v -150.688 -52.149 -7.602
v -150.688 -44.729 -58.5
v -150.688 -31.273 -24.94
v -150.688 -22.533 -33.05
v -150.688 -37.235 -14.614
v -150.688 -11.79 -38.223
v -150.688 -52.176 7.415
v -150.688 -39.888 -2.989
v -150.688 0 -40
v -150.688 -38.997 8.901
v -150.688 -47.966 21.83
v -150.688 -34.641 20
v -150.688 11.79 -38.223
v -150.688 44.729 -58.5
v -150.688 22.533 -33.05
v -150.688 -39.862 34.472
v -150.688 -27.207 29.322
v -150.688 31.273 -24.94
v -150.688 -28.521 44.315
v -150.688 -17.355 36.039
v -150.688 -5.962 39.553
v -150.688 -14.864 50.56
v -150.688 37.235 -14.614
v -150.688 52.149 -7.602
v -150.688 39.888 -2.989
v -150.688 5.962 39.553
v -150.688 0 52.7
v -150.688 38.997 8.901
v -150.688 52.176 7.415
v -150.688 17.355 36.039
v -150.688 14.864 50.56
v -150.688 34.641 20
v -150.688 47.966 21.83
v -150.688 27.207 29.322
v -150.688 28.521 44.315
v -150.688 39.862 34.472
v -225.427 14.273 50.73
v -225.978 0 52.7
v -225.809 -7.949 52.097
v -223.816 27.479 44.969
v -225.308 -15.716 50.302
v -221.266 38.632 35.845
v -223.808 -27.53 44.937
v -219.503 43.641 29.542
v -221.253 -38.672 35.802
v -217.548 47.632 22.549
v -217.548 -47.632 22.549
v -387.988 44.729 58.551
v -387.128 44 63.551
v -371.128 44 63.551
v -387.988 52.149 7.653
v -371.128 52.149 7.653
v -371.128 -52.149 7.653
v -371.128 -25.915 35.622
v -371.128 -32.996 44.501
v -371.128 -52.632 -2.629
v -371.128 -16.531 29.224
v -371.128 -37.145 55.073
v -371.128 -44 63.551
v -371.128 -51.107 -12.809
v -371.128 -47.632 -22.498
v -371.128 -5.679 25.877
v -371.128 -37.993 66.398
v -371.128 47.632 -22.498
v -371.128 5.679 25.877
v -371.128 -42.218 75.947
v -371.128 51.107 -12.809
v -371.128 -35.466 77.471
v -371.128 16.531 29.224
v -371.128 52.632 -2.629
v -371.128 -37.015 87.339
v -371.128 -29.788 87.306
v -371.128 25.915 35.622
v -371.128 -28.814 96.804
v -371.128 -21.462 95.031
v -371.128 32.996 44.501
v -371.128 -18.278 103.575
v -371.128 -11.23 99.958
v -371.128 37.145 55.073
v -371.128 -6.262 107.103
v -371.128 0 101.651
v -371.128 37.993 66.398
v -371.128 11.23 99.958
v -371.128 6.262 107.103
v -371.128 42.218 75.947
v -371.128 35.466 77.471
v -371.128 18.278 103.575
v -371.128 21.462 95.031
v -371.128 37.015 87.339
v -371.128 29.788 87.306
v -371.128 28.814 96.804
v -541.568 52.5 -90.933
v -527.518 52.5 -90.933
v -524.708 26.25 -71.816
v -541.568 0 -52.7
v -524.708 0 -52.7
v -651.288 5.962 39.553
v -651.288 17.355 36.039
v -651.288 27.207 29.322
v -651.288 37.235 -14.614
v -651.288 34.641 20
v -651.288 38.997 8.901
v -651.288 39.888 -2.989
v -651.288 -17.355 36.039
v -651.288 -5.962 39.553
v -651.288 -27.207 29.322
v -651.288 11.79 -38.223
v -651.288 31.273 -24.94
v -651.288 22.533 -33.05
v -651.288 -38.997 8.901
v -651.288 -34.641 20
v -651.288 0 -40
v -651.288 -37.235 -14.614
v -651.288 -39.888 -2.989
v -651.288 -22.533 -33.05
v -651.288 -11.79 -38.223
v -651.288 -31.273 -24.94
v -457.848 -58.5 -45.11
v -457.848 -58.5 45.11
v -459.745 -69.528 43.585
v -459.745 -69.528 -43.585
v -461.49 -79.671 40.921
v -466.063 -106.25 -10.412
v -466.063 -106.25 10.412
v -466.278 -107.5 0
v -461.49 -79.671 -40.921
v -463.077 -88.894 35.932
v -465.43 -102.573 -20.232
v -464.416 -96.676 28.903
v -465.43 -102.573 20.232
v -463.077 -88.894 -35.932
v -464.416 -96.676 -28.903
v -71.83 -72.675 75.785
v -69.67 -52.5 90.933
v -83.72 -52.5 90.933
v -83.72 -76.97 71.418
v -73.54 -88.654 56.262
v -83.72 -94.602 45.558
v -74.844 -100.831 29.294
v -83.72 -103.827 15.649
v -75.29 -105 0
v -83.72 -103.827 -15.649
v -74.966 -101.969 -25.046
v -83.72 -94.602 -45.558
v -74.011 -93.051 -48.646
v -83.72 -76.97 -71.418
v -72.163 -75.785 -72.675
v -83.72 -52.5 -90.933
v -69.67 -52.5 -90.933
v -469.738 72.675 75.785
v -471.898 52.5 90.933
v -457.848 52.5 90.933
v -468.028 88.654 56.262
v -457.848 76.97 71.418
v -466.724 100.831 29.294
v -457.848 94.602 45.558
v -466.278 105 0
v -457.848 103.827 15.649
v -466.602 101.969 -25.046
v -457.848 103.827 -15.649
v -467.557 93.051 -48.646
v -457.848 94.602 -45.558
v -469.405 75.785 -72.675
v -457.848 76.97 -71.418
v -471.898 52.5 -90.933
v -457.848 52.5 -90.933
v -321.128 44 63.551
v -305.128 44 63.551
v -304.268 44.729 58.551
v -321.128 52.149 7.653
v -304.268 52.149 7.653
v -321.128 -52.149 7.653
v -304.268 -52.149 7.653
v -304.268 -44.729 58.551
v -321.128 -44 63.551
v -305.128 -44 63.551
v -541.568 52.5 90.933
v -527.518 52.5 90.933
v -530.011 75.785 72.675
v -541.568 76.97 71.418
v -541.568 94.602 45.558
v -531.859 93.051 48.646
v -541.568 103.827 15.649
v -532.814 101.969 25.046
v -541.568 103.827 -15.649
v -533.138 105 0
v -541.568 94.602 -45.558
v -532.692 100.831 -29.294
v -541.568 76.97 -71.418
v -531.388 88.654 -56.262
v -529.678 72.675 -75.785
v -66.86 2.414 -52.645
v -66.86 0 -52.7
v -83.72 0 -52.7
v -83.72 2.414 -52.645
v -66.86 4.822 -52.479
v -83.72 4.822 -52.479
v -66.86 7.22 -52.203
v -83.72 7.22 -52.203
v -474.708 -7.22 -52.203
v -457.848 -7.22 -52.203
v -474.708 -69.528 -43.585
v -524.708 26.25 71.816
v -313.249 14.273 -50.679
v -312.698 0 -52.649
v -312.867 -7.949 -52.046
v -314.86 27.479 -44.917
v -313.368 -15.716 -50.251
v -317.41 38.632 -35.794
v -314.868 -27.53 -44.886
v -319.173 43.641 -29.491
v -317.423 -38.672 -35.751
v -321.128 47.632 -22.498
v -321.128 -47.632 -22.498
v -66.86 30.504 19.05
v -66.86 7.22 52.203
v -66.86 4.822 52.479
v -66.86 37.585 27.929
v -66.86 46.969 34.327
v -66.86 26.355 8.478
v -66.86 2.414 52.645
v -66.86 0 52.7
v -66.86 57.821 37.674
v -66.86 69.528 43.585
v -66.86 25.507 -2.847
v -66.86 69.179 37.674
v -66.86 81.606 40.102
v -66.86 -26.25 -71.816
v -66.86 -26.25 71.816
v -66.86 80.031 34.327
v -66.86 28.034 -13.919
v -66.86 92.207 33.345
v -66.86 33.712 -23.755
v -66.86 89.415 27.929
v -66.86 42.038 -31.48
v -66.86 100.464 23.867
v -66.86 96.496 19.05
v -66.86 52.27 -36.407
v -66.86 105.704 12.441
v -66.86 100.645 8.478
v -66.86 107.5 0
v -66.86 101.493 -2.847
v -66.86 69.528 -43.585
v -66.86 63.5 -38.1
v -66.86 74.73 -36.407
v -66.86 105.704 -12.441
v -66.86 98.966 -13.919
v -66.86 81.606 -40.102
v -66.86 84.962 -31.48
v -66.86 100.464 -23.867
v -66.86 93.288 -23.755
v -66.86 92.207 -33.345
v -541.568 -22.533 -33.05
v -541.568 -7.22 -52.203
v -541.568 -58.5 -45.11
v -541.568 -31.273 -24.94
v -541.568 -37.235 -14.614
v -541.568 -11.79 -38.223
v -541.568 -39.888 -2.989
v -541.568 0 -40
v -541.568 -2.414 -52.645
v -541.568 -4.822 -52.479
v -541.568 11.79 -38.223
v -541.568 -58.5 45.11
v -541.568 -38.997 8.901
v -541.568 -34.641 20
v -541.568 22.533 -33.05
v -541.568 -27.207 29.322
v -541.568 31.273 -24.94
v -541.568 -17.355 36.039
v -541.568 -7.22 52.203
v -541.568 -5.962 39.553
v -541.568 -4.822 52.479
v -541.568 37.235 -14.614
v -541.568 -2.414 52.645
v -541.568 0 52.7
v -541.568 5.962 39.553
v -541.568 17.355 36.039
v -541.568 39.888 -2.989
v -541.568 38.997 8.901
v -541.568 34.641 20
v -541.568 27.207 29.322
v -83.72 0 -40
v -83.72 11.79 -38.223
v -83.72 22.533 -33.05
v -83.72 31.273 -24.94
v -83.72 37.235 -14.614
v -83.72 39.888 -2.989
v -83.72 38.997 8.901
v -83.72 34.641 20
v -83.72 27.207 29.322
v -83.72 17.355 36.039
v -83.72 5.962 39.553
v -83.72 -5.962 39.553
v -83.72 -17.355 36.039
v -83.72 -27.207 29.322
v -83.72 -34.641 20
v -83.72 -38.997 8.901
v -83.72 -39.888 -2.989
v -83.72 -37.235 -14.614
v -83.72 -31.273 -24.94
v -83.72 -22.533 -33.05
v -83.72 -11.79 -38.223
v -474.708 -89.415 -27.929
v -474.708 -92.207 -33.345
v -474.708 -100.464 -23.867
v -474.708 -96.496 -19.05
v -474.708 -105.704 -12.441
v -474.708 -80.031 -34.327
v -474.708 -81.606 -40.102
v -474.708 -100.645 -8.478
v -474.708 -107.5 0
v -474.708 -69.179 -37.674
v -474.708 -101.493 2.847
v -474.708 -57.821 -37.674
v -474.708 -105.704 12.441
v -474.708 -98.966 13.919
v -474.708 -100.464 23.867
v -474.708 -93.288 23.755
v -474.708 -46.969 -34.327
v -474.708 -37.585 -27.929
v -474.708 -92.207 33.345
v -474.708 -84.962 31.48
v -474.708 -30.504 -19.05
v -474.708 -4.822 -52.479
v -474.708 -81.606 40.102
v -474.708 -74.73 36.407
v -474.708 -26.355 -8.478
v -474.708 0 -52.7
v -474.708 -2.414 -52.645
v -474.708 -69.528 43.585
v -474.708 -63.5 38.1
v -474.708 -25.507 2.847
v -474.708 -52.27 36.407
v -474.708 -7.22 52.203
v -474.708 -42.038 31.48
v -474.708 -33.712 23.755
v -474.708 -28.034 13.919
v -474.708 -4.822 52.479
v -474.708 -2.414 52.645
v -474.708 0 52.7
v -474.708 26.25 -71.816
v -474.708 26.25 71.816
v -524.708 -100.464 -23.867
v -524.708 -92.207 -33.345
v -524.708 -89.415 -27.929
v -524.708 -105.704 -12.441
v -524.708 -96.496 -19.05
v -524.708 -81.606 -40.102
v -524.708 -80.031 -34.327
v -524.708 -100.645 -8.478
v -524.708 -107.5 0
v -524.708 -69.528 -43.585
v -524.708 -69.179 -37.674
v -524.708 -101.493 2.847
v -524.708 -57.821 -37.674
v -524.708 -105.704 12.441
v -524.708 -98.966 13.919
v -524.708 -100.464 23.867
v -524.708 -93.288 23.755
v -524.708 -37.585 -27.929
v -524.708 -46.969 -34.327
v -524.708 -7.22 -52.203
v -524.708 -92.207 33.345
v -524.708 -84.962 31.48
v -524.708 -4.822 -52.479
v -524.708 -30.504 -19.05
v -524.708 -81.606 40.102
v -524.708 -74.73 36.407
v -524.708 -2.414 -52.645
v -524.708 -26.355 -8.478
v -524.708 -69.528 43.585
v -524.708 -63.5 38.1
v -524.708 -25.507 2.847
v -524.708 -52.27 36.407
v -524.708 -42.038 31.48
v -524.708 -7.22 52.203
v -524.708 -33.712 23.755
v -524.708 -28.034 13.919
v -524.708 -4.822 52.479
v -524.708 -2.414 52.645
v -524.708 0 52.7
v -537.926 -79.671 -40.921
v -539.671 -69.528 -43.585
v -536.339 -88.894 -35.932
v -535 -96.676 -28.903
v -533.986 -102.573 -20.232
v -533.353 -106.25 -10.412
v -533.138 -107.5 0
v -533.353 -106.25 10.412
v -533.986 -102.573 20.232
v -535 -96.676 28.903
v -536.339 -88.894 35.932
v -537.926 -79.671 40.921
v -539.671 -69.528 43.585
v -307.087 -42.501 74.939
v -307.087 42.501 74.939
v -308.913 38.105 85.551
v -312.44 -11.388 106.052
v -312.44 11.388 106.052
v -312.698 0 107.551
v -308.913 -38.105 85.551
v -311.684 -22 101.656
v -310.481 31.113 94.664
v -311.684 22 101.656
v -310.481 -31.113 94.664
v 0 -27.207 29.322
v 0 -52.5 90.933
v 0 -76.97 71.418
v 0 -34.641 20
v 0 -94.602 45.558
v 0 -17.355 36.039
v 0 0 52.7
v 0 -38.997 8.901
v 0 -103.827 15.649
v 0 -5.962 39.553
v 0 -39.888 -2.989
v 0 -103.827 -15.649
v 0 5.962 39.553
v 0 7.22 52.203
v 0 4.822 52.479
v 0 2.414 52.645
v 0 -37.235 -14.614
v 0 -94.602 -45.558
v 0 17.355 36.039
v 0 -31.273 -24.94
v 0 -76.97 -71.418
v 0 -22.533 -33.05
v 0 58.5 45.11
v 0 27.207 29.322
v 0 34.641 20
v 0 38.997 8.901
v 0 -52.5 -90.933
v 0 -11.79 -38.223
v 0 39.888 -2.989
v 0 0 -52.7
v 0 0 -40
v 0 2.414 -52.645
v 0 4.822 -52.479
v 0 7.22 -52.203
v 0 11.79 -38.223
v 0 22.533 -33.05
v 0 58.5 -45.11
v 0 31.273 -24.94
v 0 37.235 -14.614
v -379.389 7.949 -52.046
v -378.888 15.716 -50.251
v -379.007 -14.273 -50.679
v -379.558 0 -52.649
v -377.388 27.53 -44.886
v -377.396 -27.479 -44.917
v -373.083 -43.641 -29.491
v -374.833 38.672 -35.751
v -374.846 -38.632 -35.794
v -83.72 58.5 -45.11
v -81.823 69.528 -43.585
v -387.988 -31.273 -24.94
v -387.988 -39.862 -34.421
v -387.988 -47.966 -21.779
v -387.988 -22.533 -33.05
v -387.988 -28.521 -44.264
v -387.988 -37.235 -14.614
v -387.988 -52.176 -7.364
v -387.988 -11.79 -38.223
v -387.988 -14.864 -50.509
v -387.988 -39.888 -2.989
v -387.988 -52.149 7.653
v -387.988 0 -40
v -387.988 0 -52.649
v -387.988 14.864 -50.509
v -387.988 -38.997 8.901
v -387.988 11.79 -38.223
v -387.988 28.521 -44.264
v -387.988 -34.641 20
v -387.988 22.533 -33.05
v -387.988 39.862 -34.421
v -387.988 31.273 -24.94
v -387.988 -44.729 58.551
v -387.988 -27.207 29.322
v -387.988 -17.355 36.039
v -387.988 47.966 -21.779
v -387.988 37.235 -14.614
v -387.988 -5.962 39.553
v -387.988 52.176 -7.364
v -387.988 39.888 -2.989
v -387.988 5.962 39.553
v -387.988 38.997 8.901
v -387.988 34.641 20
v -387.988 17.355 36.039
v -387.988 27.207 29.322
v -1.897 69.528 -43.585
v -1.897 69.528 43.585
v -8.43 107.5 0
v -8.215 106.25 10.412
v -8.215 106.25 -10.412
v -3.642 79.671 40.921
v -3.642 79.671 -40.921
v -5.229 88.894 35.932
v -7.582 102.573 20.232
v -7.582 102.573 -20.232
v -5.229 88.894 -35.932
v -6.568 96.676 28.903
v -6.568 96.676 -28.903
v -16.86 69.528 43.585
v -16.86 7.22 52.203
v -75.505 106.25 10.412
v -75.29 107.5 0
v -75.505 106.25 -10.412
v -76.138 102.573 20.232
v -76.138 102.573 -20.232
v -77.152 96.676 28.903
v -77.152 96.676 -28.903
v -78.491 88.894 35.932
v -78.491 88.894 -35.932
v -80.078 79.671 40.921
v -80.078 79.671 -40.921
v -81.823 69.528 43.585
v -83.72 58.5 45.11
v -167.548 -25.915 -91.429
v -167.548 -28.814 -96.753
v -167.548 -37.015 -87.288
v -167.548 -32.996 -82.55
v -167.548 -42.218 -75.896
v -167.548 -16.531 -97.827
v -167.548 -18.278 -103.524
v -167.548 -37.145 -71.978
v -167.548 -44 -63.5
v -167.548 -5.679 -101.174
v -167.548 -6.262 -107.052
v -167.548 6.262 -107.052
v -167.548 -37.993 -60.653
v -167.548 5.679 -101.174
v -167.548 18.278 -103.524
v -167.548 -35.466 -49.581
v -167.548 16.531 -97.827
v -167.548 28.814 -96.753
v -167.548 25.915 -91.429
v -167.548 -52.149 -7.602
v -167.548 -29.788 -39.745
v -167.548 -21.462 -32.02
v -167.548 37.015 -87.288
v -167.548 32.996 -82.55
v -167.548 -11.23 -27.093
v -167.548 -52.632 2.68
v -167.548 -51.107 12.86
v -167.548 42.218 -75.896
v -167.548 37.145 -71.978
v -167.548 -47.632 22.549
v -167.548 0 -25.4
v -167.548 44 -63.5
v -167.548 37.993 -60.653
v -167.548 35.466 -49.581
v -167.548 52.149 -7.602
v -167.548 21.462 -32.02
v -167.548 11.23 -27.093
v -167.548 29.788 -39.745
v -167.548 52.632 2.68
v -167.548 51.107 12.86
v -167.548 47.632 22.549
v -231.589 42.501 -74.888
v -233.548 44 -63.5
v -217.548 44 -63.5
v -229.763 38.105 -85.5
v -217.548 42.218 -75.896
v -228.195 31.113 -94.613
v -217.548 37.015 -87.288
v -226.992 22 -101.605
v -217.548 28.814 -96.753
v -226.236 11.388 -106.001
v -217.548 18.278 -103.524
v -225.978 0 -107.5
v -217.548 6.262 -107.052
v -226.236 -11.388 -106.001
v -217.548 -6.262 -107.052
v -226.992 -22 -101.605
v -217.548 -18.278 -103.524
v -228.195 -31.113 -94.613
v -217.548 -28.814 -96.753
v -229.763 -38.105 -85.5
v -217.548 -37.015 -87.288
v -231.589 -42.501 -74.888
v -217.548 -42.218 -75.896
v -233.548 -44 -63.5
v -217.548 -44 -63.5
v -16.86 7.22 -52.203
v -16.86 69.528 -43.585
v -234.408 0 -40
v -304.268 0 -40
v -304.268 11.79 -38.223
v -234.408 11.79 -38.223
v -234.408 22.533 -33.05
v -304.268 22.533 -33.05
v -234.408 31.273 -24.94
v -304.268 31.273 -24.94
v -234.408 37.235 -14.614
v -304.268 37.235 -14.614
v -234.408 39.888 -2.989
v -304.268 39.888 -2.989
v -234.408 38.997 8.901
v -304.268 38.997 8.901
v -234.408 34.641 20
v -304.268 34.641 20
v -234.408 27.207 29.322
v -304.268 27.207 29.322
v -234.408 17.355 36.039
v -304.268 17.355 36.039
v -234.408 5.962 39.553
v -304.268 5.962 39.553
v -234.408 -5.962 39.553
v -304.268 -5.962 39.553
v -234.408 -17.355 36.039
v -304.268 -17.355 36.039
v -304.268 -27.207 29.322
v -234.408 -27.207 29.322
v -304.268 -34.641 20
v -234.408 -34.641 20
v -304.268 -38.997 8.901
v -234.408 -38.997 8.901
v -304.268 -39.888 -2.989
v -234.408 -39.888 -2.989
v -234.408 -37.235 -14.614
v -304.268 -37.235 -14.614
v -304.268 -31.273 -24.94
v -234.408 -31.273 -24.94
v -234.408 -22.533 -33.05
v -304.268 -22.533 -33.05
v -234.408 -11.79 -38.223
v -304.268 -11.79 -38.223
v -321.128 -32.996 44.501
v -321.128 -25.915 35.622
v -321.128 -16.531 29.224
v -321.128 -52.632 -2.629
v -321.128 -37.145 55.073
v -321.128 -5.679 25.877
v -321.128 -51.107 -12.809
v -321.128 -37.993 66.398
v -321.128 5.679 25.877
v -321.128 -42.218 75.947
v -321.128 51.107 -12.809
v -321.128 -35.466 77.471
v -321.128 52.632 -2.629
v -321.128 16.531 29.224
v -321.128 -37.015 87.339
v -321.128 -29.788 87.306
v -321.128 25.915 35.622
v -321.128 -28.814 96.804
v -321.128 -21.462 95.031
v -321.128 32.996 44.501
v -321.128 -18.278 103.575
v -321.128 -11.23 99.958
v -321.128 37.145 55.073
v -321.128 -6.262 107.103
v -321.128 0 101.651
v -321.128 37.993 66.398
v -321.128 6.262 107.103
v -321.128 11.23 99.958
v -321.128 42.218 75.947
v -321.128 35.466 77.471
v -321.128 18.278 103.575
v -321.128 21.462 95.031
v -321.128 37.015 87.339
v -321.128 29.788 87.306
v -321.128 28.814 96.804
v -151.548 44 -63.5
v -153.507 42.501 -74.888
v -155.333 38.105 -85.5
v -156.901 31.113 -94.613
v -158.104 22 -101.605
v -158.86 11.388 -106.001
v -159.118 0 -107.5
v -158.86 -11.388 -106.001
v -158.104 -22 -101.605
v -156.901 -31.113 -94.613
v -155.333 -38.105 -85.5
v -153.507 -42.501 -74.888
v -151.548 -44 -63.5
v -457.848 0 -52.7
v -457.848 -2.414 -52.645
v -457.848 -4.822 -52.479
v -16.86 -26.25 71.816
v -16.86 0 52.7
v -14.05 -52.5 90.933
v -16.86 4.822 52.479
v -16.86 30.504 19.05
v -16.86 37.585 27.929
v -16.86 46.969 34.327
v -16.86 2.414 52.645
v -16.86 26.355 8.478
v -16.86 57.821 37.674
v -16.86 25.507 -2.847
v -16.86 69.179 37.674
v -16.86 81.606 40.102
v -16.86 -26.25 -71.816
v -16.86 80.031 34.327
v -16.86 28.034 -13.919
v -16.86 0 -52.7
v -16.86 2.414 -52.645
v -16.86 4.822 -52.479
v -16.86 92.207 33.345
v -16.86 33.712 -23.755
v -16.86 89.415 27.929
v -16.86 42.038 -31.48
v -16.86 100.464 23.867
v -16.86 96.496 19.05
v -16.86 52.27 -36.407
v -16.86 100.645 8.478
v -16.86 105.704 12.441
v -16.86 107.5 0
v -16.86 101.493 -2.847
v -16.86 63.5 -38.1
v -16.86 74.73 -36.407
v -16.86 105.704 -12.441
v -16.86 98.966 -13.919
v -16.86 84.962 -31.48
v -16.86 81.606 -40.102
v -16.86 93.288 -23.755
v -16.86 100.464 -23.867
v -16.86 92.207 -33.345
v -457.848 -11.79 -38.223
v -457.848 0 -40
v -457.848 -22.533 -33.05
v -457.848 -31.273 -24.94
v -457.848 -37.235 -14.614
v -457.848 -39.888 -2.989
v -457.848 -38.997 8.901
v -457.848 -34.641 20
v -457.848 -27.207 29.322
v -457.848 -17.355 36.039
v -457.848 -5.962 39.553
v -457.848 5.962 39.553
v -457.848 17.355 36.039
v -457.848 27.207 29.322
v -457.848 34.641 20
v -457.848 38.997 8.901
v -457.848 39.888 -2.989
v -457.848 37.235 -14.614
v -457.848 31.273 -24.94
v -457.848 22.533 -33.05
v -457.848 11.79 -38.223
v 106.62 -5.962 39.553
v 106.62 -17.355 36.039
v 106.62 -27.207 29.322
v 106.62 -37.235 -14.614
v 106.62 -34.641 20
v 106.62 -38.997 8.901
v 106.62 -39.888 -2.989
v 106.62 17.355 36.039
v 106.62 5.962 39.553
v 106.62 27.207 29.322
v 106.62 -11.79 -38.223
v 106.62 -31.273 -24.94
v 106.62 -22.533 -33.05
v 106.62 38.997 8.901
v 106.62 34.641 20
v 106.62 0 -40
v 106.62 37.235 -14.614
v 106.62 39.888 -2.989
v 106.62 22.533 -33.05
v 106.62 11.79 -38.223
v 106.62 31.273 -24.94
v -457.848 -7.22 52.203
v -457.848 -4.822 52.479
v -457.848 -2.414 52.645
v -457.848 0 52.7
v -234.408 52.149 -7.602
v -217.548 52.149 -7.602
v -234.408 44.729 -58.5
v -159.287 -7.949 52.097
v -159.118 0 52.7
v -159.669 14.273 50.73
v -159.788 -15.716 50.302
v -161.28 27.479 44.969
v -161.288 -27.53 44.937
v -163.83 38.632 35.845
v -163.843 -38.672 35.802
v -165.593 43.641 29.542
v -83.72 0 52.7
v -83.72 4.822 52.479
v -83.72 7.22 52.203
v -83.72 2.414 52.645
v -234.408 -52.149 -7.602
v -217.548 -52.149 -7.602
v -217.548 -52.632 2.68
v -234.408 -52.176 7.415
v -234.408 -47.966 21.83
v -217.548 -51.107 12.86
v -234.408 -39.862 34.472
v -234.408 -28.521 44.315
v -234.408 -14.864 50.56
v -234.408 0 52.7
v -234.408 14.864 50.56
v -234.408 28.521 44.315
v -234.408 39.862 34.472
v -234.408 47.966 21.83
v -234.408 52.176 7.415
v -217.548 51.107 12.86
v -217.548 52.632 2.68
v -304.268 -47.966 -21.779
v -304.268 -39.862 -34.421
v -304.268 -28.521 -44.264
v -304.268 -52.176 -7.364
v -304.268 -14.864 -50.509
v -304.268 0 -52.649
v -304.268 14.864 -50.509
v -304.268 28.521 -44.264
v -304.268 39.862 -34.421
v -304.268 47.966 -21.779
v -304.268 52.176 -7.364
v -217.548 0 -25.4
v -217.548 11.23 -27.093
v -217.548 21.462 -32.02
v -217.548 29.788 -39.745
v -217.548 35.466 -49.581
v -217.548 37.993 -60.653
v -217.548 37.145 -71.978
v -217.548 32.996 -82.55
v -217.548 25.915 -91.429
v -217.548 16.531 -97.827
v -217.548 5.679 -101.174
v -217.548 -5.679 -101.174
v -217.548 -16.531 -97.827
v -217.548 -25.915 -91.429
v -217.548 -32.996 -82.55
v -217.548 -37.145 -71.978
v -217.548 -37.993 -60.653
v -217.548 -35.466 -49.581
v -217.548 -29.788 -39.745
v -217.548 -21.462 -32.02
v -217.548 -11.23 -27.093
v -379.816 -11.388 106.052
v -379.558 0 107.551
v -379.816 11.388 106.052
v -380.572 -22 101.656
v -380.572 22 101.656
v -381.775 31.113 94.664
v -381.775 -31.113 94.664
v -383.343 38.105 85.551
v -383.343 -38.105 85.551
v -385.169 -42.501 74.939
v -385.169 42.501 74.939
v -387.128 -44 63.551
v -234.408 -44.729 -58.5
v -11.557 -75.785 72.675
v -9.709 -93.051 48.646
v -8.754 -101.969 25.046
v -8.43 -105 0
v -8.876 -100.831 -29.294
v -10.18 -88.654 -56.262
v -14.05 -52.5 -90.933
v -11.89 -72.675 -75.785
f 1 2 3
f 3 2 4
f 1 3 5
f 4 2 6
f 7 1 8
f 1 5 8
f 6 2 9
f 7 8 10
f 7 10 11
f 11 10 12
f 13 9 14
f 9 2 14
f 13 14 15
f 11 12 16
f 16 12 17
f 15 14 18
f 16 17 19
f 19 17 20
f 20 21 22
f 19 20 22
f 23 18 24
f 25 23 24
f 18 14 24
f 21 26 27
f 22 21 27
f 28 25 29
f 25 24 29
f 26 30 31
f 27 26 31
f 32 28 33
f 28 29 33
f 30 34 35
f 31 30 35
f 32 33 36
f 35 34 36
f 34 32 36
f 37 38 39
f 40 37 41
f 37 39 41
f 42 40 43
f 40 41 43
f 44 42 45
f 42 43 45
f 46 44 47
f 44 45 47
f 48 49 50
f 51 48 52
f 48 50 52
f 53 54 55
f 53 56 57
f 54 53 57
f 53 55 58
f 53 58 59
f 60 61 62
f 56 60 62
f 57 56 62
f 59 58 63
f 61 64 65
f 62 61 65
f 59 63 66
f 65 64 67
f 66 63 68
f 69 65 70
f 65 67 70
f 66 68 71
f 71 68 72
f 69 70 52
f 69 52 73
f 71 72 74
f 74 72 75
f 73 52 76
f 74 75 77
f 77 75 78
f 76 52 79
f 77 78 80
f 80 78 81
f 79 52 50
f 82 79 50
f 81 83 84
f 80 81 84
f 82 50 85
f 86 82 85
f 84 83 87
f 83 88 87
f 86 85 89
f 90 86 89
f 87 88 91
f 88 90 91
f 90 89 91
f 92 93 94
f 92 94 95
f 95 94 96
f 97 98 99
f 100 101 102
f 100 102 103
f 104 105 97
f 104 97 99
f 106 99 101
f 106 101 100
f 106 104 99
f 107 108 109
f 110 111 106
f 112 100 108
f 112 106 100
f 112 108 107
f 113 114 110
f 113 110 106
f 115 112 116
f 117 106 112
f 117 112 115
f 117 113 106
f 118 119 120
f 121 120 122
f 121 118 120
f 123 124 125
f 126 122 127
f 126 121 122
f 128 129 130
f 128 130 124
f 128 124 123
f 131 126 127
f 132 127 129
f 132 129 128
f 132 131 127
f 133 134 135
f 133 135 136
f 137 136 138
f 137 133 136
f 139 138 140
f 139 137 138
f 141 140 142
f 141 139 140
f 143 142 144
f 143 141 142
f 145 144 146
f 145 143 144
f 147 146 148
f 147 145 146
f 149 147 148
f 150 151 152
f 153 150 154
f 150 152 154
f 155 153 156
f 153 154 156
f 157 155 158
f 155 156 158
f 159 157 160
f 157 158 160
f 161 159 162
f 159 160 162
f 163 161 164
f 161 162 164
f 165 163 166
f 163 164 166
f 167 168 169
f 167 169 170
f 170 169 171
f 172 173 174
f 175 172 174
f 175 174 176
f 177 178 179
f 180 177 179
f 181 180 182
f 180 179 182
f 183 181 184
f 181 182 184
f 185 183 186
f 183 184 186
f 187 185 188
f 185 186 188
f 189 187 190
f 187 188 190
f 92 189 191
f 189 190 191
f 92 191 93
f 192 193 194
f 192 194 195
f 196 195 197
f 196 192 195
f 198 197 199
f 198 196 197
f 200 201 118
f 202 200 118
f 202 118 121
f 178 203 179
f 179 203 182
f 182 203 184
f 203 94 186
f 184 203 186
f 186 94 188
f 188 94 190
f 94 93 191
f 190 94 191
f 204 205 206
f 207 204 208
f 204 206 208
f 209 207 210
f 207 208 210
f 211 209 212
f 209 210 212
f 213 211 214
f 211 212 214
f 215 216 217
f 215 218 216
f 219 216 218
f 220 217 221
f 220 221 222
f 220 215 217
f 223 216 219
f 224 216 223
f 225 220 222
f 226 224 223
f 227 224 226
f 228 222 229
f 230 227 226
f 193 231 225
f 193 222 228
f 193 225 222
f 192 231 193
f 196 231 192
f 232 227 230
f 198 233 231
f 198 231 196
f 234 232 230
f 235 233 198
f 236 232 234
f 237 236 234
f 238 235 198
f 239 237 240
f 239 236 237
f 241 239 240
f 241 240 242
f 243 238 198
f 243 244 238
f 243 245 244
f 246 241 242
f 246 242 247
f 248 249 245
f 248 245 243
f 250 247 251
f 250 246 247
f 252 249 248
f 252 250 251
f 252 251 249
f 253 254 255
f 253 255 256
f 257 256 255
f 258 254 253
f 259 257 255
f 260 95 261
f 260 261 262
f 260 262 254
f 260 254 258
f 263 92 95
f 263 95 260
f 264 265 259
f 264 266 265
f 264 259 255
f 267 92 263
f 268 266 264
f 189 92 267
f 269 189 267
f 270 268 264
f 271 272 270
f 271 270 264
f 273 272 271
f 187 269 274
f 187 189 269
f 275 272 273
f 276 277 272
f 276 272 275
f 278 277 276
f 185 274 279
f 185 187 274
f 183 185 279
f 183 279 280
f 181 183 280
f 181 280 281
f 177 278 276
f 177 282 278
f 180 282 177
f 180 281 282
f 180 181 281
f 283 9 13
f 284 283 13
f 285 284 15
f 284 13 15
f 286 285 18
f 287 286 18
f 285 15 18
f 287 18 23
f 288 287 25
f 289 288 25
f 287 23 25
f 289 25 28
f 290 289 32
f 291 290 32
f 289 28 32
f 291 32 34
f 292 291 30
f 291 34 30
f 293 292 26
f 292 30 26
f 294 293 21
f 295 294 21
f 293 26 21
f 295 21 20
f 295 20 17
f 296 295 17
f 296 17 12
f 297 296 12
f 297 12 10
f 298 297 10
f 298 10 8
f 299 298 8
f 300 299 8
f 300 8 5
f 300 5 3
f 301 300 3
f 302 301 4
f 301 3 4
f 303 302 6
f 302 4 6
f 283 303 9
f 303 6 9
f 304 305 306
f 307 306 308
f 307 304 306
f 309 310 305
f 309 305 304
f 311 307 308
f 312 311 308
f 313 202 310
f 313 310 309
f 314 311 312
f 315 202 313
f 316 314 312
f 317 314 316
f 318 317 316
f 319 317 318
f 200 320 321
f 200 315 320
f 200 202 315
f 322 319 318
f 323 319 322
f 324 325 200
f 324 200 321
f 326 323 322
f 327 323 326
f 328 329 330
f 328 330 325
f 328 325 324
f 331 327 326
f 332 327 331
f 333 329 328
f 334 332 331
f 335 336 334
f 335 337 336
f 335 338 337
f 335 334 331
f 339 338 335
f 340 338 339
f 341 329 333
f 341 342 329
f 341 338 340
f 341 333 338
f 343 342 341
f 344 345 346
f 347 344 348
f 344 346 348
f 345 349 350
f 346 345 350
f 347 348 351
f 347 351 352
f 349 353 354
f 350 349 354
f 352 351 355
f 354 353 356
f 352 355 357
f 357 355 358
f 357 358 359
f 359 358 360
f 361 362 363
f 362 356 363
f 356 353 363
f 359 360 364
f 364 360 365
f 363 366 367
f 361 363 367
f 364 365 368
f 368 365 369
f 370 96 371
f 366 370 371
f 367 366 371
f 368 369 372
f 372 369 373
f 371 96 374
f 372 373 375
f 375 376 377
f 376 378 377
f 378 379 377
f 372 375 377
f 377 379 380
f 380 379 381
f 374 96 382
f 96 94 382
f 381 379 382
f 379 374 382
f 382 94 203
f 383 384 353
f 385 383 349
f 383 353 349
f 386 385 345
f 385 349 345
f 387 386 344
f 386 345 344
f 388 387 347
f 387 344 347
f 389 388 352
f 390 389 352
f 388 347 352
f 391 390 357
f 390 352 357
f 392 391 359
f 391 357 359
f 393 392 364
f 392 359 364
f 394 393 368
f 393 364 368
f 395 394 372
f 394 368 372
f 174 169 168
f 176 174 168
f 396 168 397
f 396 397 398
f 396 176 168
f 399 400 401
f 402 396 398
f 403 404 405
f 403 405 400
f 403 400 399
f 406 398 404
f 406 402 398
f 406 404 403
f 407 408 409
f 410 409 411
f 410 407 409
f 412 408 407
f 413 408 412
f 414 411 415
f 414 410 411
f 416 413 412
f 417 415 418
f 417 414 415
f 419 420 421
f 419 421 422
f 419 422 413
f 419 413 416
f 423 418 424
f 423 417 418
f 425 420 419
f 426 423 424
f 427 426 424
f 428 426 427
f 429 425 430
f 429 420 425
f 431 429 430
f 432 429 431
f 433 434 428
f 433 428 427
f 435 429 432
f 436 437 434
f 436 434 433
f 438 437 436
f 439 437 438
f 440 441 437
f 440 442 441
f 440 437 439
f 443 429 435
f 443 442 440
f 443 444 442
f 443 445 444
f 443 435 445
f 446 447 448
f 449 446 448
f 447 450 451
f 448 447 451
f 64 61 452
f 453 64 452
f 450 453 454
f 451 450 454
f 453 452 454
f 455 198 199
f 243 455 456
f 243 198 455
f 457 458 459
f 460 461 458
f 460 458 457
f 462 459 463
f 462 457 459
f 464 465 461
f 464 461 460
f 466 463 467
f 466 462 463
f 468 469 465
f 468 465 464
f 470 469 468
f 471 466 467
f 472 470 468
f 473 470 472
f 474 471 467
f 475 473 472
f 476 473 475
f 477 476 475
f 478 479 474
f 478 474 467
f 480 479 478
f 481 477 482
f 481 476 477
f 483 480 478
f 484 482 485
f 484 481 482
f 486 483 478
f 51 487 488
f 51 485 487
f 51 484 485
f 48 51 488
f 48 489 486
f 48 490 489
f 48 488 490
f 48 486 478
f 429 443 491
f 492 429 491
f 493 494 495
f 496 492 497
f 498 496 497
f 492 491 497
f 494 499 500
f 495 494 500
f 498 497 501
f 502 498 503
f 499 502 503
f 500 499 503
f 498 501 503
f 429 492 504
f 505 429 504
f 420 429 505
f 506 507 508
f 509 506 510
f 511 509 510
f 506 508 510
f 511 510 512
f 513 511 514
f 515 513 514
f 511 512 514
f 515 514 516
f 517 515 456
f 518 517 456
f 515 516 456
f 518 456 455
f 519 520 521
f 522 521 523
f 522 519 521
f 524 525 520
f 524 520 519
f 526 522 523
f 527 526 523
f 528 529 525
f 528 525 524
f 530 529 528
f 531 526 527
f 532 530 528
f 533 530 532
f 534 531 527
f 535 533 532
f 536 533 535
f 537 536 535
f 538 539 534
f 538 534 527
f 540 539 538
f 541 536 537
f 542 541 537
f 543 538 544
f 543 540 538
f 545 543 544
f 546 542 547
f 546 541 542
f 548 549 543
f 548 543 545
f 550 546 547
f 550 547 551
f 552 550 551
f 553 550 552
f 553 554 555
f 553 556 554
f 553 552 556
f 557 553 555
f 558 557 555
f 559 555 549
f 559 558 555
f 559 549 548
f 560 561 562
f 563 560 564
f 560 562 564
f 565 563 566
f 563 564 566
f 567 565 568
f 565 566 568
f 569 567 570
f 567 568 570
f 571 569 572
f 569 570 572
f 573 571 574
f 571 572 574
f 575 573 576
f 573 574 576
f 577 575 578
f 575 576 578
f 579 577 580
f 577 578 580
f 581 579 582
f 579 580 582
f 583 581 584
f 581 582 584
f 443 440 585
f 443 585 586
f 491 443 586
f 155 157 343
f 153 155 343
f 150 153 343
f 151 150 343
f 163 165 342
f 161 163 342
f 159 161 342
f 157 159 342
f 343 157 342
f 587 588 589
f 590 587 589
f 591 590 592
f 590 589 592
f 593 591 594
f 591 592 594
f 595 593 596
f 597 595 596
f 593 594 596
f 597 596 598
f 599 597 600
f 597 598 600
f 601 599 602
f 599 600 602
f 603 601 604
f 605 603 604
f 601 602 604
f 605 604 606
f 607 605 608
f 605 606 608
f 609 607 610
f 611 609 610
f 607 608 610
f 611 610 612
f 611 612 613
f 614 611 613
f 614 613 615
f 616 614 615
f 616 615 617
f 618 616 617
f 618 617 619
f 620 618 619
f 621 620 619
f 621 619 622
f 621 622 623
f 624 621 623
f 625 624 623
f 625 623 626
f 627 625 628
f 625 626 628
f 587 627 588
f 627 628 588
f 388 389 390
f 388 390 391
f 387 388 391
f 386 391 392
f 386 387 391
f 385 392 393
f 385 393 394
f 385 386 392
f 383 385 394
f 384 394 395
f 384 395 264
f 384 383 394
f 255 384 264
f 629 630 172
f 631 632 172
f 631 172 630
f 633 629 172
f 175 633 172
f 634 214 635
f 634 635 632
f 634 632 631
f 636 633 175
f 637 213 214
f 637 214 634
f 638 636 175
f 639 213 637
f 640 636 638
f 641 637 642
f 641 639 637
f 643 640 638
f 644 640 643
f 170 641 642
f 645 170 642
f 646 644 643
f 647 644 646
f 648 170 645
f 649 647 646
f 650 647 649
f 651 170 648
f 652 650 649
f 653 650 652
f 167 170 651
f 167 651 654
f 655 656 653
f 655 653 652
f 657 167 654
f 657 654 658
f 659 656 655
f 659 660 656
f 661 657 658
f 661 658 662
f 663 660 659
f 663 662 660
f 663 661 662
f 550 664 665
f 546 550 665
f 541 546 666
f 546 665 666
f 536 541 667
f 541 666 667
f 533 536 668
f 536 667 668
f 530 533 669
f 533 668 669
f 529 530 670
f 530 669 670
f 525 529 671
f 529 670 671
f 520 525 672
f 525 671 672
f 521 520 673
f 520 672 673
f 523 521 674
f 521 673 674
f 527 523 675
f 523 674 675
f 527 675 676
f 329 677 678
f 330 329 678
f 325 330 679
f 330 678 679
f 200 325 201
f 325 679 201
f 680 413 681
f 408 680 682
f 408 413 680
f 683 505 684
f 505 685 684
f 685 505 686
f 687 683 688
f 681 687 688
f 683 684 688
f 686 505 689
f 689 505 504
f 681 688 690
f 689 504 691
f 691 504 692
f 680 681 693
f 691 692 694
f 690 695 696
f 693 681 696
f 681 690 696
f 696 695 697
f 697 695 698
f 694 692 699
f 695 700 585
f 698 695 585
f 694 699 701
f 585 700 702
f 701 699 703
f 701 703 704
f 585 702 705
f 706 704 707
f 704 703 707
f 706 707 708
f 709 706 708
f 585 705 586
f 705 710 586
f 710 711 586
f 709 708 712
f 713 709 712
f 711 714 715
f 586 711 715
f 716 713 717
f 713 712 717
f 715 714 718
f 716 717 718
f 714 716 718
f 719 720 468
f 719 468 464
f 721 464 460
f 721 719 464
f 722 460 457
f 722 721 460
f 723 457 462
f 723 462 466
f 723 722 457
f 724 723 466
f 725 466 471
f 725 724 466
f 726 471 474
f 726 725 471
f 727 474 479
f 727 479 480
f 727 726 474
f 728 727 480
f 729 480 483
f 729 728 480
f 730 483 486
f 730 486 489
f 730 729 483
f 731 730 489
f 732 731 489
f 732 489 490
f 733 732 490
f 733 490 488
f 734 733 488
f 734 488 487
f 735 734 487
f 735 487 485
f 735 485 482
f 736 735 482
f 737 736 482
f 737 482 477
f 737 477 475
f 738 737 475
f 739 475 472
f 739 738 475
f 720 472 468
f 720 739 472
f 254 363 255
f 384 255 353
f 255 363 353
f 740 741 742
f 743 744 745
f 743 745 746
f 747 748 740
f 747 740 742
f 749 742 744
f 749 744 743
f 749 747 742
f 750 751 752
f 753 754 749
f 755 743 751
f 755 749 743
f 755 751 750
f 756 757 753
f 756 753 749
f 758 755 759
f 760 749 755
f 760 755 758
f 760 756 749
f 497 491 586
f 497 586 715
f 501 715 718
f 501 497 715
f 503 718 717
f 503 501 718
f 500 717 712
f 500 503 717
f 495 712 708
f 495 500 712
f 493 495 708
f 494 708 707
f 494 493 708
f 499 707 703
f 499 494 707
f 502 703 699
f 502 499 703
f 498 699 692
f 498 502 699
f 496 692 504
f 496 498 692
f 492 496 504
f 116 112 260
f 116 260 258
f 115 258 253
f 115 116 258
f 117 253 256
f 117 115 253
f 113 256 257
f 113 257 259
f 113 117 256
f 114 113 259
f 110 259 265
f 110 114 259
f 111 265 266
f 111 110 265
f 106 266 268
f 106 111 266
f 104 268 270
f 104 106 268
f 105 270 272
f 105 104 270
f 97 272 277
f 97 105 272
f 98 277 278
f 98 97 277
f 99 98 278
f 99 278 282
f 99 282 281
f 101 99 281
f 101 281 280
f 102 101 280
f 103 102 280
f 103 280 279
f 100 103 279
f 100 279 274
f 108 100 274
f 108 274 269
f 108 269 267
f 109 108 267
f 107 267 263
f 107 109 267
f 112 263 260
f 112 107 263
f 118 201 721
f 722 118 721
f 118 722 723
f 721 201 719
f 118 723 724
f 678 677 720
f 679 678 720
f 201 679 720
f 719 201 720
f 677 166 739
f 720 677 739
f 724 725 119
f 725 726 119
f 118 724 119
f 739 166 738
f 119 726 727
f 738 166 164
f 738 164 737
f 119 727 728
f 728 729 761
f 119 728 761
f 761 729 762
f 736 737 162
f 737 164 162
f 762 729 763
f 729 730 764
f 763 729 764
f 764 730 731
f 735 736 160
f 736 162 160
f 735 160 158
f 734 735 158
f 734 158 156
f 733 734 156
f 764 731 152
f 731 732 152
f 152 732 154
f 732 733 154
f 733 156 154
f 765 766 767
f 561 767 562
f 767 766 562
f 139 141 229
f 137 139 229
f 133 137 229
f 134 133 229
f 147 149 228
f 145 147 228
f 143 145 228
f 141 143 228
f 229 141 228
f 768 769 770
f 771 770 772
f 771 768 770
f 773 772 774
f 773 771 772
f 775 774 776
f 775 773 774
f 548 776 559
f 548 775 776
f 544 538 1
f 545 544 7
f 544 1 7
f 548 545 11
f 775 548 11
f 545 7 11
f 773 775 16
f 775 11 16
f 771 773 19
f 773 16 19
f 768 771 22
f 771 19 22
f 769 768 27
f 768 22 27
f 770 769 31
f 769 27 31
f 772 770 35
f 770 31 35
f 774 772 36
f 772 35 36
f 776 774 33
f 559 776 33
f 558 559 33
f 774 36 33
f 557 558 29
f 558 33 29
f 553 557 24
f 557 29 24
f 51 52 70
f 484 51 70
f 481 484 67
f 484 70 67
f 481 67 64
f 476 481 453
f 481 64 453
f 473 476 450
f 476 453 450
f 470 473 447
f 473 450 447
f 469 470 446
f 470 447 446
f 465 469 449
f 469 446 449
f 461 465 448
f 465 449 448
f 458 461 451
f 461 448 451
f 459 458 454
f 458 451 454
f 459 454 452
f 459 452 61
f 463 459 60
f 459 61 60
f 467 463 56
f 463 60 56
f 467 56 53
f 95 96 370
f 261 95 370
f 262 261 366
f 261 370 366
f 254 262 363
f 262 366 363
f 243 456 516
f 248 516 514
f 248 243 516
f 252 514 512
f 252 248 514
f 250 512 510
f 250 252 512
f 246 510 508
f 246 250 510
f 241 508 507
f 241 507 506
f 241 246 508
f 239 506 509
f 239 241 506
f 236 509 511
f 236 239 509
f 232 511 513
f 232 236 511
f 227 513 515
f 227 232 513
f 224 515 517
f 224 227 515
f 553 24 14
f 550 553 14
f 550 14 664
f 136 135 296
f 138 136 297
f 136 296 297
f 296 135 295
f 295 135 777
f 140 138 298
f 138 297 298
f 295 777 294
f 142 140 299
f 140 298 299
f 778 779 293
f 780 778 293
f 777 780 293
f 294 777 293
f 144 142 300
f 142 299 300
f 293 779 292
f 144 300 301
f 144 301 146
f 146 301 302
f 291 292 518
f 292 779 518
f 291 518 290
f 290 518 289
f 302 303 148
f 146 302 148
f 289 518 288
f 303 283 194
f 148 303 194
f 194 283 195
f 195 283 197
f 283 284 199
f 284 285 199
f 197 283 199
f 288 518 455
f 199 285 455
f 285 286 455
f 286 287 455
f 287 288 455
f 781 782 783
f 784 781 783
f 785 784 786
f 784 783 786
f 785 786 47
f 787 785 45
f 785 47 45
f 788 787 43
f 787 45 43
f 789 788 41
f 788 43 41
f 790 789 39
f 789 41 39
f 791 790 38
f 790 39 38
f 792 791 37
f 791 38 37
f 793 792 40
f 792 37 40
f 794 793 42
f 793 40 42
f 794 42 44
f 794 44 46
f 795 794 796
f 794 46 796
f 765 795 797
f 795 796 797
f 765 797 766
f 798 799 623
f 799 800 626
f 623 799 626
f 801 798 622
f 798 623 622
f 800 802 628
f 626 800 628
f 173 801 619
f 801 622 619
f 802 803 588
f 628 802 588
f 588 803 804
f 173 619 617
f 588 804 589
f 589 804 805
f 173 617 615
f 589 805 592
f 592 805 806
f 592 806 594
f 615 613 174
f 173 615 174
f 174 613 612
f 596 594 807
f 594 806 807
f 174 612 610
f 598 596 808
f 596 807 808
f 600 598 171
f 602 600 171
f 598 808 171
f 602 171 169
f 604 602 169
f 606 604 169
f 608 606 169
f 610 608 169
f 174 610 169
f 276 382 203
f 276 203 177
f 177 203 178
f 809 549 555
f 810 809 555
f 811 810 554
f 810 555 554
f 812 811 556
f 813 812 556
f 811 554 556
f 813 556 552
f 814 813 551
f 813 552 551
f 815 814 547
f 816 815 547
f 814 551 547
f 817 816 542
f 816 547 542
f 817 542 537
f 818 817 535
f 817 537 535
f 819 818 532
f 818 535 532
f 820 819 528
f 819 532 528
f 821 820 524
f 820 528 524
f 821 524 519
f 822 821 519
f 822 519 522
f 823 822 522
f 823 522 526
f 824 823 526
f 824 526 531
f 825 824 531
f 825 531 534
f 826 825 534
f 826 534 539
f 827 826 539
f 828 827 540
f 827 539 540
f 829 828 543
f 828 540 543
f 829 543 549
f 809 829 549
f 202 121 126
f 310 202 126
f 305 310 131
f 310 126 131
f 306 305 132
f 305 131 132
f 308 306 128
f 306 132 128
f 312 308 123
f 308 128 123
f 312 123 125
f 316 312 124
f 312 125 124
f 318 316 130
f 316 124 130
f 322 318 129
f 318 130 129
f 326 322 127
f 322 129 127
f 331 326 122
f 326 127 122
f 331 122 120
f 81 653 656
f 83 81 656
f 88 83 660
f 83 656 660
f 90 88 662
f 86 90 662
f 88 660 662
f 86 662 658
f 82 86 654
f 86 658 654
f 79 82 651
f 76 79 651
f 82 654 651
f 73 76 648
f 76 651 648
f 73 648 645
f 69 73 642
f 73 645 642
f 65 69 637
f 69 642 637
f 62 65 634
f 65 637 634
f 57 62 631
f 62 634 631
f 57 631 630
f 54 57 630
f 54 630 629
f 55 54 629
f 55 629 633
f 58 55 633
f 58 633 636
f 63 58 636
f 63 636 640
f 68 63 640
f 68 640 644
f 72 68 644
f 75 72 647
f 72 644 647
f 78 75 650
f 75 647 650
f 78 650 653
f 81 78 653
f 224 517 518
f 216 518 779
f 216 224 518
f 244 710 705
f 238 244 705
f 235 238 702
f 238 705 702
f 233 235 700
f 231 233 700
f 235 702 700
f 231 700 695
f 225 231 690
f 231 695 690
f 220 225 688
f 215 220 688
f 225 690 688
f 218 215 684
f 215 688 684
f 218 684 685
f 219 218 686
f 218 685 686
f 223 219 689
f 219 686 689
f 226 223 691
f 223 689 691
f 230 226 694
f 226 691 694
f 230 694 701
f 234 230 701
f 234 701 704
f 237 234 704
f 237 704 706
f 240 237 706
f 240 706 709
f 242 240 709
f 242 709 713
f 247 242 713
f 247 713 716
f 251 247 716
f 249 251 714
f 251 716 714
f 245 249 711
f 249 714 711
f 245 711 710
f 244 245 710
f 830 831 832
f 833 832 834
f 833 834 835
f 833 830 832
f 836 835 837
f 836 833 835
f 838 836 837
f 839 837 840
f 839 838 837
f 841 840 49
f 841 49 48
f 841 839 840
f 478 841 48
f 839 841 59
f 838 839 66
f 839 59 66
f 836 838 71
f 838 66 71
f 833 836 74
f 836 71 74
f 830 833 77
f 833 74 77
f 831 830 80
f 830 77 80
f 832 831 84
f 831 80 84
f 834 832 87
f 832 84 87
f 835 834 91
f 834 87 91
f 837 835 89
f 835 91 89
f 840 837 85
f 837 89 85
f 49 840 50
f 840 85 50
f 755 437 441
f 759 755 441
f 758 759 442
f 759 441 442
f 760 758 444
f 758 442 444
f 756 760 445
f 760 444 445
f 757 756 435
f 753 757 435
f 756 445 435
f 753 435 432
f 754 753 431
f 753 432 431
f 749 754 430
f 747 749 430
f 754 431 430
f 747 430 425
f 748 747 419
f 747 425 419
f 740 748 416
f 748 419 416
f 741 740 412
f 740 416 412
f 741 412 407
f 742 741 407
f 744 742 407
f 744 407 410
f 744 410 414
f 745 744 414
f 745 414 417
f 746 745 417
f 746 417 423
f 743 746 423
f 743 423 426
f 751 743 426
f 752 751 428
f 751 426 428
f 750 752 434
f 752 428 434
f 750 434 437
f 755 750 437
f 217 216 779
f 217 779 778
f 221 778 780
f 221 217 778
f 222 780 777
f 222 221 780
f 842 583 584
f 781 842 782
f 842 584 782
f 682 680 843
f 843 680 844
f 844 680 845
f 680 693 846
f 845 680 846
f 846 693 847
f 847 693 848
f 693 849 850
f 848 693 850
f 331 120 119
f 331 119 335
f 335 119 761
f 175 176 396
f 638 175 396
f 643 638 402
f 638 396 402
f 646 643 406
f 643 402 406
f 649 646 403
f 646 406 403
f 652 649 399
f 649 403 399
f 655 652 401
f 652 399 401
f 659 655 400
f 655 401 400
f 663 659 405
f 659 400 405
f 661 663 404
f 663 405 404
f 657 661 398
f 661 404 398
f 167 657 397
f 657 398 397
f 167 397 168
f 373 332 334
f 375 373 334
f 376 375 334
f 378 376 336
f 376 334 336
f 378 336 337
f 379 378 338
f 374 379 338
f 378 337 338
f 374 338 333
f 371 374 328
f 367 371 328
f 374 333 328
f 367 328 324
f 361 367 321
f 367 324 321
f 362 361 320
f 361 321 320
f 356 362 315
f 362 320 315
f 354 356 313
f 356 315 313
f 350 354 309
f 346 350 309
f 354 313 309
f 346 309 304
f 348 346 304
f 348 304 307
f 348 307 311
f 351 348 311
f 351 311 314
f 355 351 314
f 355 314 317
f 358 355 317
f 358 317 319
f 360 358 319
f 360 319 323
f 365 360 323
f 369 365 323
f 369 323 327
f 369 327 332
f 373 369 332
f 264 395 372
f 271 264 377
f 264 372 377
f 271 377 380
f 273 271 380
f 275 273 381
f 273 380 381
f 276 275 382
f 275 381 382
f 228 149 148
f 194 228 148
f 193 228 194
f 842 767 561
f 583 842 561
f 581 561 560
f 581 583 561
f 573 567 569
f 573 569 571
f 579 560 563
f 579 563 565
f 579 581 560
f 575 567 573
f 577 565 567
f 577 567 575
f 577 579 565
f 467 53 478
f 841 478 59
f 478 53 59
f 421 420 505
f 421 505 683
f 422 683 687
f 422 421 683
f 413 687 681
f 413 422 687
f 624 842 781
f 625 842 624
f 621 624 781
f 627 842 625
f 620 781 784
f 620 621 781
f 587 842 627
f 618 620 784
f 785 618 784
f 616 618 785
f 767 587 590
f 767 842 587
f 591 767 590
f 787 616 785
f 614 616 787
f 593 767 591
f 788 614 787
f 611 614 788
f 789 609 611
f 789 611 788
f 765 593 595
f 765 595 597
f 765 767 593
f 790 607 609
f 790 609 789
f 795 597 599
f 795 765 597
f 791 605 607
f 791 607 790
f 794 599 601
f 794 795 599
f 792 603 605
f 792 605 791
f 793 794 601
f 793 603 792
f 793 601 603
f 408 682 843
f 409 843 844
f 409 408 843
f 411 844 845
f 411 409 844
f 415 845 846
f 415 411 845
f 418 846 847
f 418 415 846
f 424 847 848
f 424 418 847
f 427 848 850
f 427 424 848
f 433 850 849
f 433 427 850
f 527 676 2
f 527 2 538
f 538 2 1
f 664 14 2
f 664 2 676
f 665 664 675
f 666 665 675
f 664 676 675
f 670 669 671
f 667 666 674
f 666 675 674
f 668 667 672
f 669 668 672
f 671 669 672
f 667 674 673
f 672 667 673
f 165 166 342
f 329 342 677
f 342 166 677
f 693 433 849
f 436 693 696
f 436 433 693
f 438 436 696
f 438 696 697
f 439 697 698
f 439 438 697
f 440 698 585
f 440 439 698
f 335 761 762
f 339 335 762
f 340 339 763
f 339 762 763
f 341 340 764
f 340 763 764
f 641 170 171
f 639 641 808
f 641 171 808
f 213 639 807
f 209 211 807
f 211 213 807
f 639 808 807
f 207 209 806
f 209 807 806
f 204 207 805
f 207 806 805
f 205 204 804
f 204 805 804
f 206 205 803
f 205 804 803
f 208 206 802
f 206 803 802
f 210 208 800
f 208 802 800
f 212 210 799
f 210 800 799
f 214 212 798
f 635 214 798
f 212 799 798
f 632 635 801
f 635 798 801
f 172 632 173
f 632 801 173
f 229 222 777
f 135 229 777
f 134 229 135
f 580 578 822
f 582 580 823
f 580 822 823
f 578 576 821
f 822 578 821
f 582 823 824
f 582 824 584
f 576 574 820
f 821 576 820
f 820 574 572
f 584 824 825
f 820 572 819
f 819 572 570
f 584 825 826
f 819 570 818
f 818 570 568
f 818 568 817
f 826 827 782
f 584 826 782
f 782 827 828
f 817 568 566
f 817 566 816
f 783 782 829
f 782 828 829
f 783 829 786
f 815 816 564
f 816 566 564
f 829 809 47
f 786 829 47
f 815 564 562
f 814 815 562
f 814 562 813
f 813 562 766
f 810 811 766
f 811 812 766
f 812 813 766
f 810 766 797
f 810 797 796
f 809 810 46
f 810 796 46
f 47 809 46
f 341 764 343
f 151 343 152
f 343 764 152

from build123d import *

# Parameters (mm, degrees)
SKETCH1_R               = 40
BOSS_EXTRUDE1_DEPTH     = 106.62
SKETCH2_R               = 44
BOSS_EXTRUDE2_DEPTH     = 16.86
SKETCH3_R               = 38.1
BOSS_EXTRUDE3_DEPTH     = 50
LPATTERN1_COUNT         = 2
LPATTERN1_PITCH         = 66.86
BOSS_EXTRUDE4_START     = -150.688
SKETCH1_2_R             = 40
BOSS_EXTRUDE4_DEPTH     = 66.968
BOSS_EXTRUDE5_DEPTH     = 16.86
SKETCH5_R               = 38.1
BOSS_EXTRUDE6_DEPTH     = 50
LPATTERN2_COUNT         = 2
LPATTERN2_PITCH         = 66.86
BOSS_EXTRUDE7_START     = -304.268
SKETCH1_3_R             = 40
BOSS_EXTRUDE7_DEPTH     = 69.86
BOSS_EXTRUDE8_DEPTH     = 16.86
SKETCH7_R               = 38.1
BOSS_EXTRUDE9_DEPTH     = 50
BOSS_EXTRUDE10_START    = 66.86
BOSS_EXTRUDE10_DEPTH    = 16.86
BOSS_EXTRUDE11_START    = 69.86
SKETCH8_R               = 40
BOSS_EXTRUDE11_DEPTH    = 69.86
SKETCH9_R               = 40
BOSS_EXTRUDE12_DEPTH    = 16.86
SKETCH10_R              = 38.1
BOSS_EXTRUDE13_DEPTH    = 50
BOSS_EXTRUDE14_START    = 66.86
SKETCH9_3_R             = 40
BOSS_EXTRUDE14_DEPTH    = 16.86
BOSS_EXTRUDE15_START    = 193.44
SKETCH9_4_R             = 40
BOSS_EXTRUDE15_DEPTH    = 109.72
CUT_EXTRUDE1_DEPTH      = 669.804560177
CUT_EXTRUDE1_DEPTH_BACK = 669.804560177
CUT_EXTRUDE2_DEPTH      = 669.804560177
CUT_EXTRUDE2_DEPTH_BACK = 669.804560177


with BuildPart() as part:
    # Sketch1 → Boss-Extrude1 (new body)
    with BuildSketch(Plane(origin=(0, 0, 0), x_dir=(0, 0, -1), z_dir=(1, 0, 0))):
        Circle(SKETCH1_R)
    extrude(amount=BOSS_EXTRUDE1_DEPTH)

    # Sketch2 → Boss-Extrude2 (add)
    with BuildSketch(Plane(origin=(0, 0, 0), x_dir=(0, 0, -1), z_dir=(1, 0, 0))):
        with BuildLine():
            Line((52.203036807, 7.220314961), (43.585078169, 69.528346457))
            ThreePointArc((43.585078169, 69.528346457), (43.89614698, 66.521304401), (44, 63.5))
            ThreePointArc((44, 63.5), (-3.021304401, 19.60385302), (-43.585078169, 69.528346457))
            Line((-43.585078169, 69.528346457), (-52.203036807, 7.220314961))
            ThreePointArc((-52.203036807, 7.220314961), (-52.575612406, 3.61869868), (-52.7, 0))
            Line((-52.7, 0), (-90.932667397, -52.5))
            ThreePointArc((-90.932667397, -52.5), (0, -105), (90.932667397, -52.5))
            Line((90.932667397, -52.5), (52.7, 0))
            ThreePointArc((52.7, 0), (52.575612406, 3.61869868), (52.203036807, 7.220314961))
        make_face()
        with Locations((0, 63.5)):
            Circle(SKETCH2_R)
    boss_extrude2 = extrude(amount=-BOSS_EXTRUDE2_DEPTH)

    # Sketch3 → Boss-Extrude3 (add)
    with BuildSketch(Plane.ZY.offset(16.86)):
        with Locations(Location((0, 63.5, 0), (0, 0, 180))):
            Circle(SKETCH3_R)
    extrude(amount=BOSS_EXTRUDE3_DEPTH)

    # LPattern1: Boss-Extrude2 ×2
    with Locations(*[(-i * LPATTERN1_PITCH, 0, 0) for i in range(1, LPATTERN1_COUNT)]):
        add(boss_extrude2)

    # Sketch1<2> → Boss-Extrude4 (add)
    with BuildSketch(Plane(origin=(0, 0, 0), x_dir=(0, 0, -1), z_dir=(1, 0, 0)).offset(BOSS_EXTRUDE4_START)):
        Circle(SKETCH1_2_R)
    extrude(amount=BOSS_EXTRUDE4_DEPTH)

    # Sketch4 → Boss-Extrude5 (add)
    with BuildSketch(Plane.ZY.offset(150.688)):
        with BuildLine():
            Line((-7.602260115, 52.148783698), (-63.5, 44))
            ThreePointArc((-63.5, 44), (-107.5, 0), (-63.5, -44))
            Line((-63.5, -44), (-7.602260115, -52.148783698))
            ThreePointArc((-7.602260115, -52.148783698), (52.7, 0), (-7.602260115, 52.148783698))
        make_face()
    boss_extrude5 = extrude(amount=BOSS_EXTRUDE5_DEPTH)

    # Sketch5 → Boss-Extrude6 (add)
    with BuildSketch(Plane.ZY.offset(167.548)):
        with Locations((-63.5, 0)):
            Circle(SKETCH5_R)
    extrude(amount=BOSS_EXTRUDE6_DEPTH)

    # LPattern2: Boss-Extrude5 ×2
    with Locations(*[(-i * LPATTERN2_PITCH, 0, 0) for i in range(1, LPATTERN2_COUNT)]):
        add(boss_extrude5)

    # Sketch1<3> → Boss-Extrude7 (add)
    with BuildSketch(Plane(origin=(0, 0, 0), x_dir=(0, 0, -1), z_dir=(1, 0, 0)).offset(BOSS_EXTRUDE7_START)):
        Circle(SKETCH1_3_R)
    extrude(amount=BOSS_EXTRUDE7_DEPTH)

    # Sketch6 → Boss-Extrude8 (add)
    with BuildSketch(Plane.ZY.offset(304.268)):
        with BuildLine():
            Line((7.653321337, -52.148783698), (63.551061222, -44))
            ThreePointArc((63.551061222, -44), (107.551061222, 0), (63.551061222, 44))
            Line((63.551061222, 44), (7.653321337, 52.148783698))
            ThreePointArc((7.653321337, 52.148783698), (-52.648938778, 0), (7.653321337, -52.148783698))
        make_face()
    extrude(amount=BOSS_EXTRUDE8_DEPTH)

    # Sketch7 → Boss-Extrude9 (add)
    with BuildSketch(Plane.ZY.offset(321.128)):
        with Locations((63.551061222, 0)):
            Circle(SKETCH7_R)
    extrude(amount=BOSS_EXTRUDE9_DEPTH)

    # Sketch6<2> → Boss-Extrude10 (add)
    with BuildSketch(Plane.ZY.offset(304.268).offset(BOSS_EXTRUDE10_START)):
        with BuildLine():
            Line((7.653321337, -52.148783698), (63.551061222, -44))
            ThreePointArc((63.551061222, -44), (107.551061222, 0), (63.551061222, 44))
            Line((63.551061222, 44), (7.653321337, 52.148783698))
            ThreePointArc((7.653321337, 52.148783698), (-52.648938778, 0), (7.653321337, -52.148783698))
        make_face()
    extrude(amount=BOSS_EXTRUDE10_DEPTH)

    # Sketch8 → Boss-Extrude11 (add)
    with BuildSketch(Plane.ZY.offset(387.988).offset(BOSS_EXTRUDE11_START)):
        with Locations(Location((0, 0, 0), (0, 0, 180))):
            Circle(SKETCH8_R)
    extrude(amount=-BOSS_EXTRUDE11_DEPTH)

    # Sketch9 → Boss-Extrude12 (add)
    # profile 1 of 2: a face of its own
    with BuildSketch(Plane.ZY.offset(457.848)):
        with BuildLine():
            Line((52.7, 0), (90.932667397, 52.5))
            ThreePointArc((90.932667397, 52.5), (0, 105), (-90.932667397, 52.5))
            Line((-90.932667397, 52.5), (-52.7, 0))
            ThreePointArc((-52.7, 0), (-52.575612406, -3.61869868), (-52.203036807, -7.220314961))
            Line((-52.203036807, -7.220314961), (-43.585078169, -69.528346457))
            ThreePointArc((-43.585078169, -69.528346457), (0, -107.5), (43.585078169, -69.528346457))
            Line((43.585078169, -69.528346457), (52.203036807, -7.220314961))
            ThreePointArc((52.203036807, -7.220314961), (52.575612406, -3.61869868), (52.7, 0))
        make_face()
        with Locations(Location((0, 0, 0), (0, 0, 180))):
            Circle(SKETCH9_R, mode=Mode.SUBTRACT)
    # profile 2 of 2: a face of its own
    with BuildSketch(Plane.ZY.offset(457.848)):
        with Locations(Location((0, 0, 0), (0, 0, 180))):
            Circle(SKETCH9_R)
    extrude(amount=BOSS_EXTRUDE12_DEPTH)

    # Sketch10 → Boss-Extrude13 (add)
    with BuildSketch(Plane.ZY.offset(474.708)):
        with Locations((0, -63.5)):
            Circle(SKETCH10_R)
    extrude(amount=BOSS_EXTRUDE13_DEPTH)

    # Sketch9<3> → Boss-Extrude14 (add)
    # profile 1 of 2: a face of its own
    with BuildSketch(Plane.ZY.offset(457.848).offset(BOSS_EXTRUDE14_START)):
        with BuildLine():
            Line((52.7, 0), (90.932667397, 52.5))
            ThreePointArc((90.932667397, 52.5), (0, 105), (-90.932667397, 52.5))
            Line((-90.932667397, 52.5), (-52.7, 0))
            ThreePointArc((-52.7, 0), (-52.575612406, -3.61869868), (-52.203036807, -7.220314961))
            Line((-52.203036807, -7.220314961), (-43.585078169, -69.528346457))
            ThreePointArc((-43.585078169, -69.528346457), (0, -107.5), (43.585078169, -69.528346457))
            Line((43.585078169, -69.528346457), (52.203036807, -7.220314961))
            ThreePointArc((52.203036807, -7.220314961), (52.575612406, -3.61869868), (52.7, 0))
        make_face()
        with Locations(Location((0, 0, 0), (0, 0, 180))):
            Circle(SKETCH9_3_R, mode=Mode.SUBTRACT)
    # profile 2 of 2: a face of its own
    with BuildSketch(Plane.ZY.offset(457.848).offset(BOSS_EXTRUDE14_START)):
        with Locations(Location((0, 0, 0), (0, 0, 180))):
            Circle(SKETCH9_3_R)
    extrude(amount=BOSS_EXTRUDE14_DEPTH)

    # Sketch9<4> → Boss-Extrude15 (add)
    with BuildSketch(Plane.ZY.offset(457.848).offset(BOSS_EXTRUDE15_START)):
        with Locations(Location((0, 0, 0), (0, 0, 180))):
            Circle(SKETCH9_4_R)
    extrude(amount=-BOSS_EXTRUDE15_DEPTH)

    # Sketch11 → Cut-Extrude1 (cut, two sides: drawn at the far end of the back side and taken through both)
    with BuildSketch(Plane.XY.offset(-CUT_EXTRUDE1_DEPTH_BACK)):
        Polygon((-533.138, 105), (-524.708, 105), (-524.708, 26.25), align=None)
        Polygon((-474.708, 105), (-466.278, 105), (-474.708, 26.25), align=None)
        Polygon((-541.568, -107.5), (-533.138, -107.5), (-541.568, -58.5), align=None)
        Polygon((-466.278, -107.5), (-457.848, -107.5), (-457.848, -58.5), align=None)
        Polygon((-75.29, -105), (-66.86, -26.25), (-66.86, -105), align=None)
        Polygon((-16.86, -26.25), (-8.43, -105), (-16.86, -105), align=None)
        Polygon((-8.43, 107.5), (0, 107.5), (0, 58.5), align=None)
        Polygon((-83.72, 107.5), (-75.29, 107.5), (-83.72, 58.5), align=None)
    extrude(amount=CUT_EXTRUDE1_DEPTH + CUT_EXTRUDE1_DEPTH_BACK, mode=Mode.SUBTRACT)

    # Sketch12 → Cut-Extrude2 (cut, two sides: drawn at the far end of the back side and taken through both)
    with BuildSketch(Plane(origin=(0, 0, 0), x_dir=(1, 0, 0), z_dir=(0, 1, 0)).offset(-CUT_EXTRUDE2_DEPTH_BACK)):
        Polygon((-379.558, -107.551061222), (-387.988, -58.551061222), (-387.988, -107.551061222), align=None)
        Polygon((-304.268, -107.551061222), (-304.268, -58.551061222), (-312.698, -107.551061222), align=None)
        Polygon((-379.558, 52.648938778), (-371.128, 52.648938778), (-371.128, 22.49780872), align=None)
        Polygon((-312.698, 52.648938778), (-321.128, 22.49780872), (-321.128, 52.648938778), align=None)
        Polygon((-159.118, 107.5), (-150.688, 107.5), (-150.688, 58.5), align=None)
        Polygon((-225.978, 107.5), (-234.408, 107.5), (-234.408, 58.5), align=None)
        Polygon((-217.548, -52.7), (-225.978, -52.7), (-217.548, -22.548869942), align=None)
        Polygon((-159.118, -52.7), (-167.548, -22.548869942), (-167.548, -52.7), align=None)
    extrude(amount=CUT_EXTRUDE2_DEPTH + CUT_EXTRUDE2_DEPTH_BACK, mode=Mode.SUBTRACT)


solid = part.part
